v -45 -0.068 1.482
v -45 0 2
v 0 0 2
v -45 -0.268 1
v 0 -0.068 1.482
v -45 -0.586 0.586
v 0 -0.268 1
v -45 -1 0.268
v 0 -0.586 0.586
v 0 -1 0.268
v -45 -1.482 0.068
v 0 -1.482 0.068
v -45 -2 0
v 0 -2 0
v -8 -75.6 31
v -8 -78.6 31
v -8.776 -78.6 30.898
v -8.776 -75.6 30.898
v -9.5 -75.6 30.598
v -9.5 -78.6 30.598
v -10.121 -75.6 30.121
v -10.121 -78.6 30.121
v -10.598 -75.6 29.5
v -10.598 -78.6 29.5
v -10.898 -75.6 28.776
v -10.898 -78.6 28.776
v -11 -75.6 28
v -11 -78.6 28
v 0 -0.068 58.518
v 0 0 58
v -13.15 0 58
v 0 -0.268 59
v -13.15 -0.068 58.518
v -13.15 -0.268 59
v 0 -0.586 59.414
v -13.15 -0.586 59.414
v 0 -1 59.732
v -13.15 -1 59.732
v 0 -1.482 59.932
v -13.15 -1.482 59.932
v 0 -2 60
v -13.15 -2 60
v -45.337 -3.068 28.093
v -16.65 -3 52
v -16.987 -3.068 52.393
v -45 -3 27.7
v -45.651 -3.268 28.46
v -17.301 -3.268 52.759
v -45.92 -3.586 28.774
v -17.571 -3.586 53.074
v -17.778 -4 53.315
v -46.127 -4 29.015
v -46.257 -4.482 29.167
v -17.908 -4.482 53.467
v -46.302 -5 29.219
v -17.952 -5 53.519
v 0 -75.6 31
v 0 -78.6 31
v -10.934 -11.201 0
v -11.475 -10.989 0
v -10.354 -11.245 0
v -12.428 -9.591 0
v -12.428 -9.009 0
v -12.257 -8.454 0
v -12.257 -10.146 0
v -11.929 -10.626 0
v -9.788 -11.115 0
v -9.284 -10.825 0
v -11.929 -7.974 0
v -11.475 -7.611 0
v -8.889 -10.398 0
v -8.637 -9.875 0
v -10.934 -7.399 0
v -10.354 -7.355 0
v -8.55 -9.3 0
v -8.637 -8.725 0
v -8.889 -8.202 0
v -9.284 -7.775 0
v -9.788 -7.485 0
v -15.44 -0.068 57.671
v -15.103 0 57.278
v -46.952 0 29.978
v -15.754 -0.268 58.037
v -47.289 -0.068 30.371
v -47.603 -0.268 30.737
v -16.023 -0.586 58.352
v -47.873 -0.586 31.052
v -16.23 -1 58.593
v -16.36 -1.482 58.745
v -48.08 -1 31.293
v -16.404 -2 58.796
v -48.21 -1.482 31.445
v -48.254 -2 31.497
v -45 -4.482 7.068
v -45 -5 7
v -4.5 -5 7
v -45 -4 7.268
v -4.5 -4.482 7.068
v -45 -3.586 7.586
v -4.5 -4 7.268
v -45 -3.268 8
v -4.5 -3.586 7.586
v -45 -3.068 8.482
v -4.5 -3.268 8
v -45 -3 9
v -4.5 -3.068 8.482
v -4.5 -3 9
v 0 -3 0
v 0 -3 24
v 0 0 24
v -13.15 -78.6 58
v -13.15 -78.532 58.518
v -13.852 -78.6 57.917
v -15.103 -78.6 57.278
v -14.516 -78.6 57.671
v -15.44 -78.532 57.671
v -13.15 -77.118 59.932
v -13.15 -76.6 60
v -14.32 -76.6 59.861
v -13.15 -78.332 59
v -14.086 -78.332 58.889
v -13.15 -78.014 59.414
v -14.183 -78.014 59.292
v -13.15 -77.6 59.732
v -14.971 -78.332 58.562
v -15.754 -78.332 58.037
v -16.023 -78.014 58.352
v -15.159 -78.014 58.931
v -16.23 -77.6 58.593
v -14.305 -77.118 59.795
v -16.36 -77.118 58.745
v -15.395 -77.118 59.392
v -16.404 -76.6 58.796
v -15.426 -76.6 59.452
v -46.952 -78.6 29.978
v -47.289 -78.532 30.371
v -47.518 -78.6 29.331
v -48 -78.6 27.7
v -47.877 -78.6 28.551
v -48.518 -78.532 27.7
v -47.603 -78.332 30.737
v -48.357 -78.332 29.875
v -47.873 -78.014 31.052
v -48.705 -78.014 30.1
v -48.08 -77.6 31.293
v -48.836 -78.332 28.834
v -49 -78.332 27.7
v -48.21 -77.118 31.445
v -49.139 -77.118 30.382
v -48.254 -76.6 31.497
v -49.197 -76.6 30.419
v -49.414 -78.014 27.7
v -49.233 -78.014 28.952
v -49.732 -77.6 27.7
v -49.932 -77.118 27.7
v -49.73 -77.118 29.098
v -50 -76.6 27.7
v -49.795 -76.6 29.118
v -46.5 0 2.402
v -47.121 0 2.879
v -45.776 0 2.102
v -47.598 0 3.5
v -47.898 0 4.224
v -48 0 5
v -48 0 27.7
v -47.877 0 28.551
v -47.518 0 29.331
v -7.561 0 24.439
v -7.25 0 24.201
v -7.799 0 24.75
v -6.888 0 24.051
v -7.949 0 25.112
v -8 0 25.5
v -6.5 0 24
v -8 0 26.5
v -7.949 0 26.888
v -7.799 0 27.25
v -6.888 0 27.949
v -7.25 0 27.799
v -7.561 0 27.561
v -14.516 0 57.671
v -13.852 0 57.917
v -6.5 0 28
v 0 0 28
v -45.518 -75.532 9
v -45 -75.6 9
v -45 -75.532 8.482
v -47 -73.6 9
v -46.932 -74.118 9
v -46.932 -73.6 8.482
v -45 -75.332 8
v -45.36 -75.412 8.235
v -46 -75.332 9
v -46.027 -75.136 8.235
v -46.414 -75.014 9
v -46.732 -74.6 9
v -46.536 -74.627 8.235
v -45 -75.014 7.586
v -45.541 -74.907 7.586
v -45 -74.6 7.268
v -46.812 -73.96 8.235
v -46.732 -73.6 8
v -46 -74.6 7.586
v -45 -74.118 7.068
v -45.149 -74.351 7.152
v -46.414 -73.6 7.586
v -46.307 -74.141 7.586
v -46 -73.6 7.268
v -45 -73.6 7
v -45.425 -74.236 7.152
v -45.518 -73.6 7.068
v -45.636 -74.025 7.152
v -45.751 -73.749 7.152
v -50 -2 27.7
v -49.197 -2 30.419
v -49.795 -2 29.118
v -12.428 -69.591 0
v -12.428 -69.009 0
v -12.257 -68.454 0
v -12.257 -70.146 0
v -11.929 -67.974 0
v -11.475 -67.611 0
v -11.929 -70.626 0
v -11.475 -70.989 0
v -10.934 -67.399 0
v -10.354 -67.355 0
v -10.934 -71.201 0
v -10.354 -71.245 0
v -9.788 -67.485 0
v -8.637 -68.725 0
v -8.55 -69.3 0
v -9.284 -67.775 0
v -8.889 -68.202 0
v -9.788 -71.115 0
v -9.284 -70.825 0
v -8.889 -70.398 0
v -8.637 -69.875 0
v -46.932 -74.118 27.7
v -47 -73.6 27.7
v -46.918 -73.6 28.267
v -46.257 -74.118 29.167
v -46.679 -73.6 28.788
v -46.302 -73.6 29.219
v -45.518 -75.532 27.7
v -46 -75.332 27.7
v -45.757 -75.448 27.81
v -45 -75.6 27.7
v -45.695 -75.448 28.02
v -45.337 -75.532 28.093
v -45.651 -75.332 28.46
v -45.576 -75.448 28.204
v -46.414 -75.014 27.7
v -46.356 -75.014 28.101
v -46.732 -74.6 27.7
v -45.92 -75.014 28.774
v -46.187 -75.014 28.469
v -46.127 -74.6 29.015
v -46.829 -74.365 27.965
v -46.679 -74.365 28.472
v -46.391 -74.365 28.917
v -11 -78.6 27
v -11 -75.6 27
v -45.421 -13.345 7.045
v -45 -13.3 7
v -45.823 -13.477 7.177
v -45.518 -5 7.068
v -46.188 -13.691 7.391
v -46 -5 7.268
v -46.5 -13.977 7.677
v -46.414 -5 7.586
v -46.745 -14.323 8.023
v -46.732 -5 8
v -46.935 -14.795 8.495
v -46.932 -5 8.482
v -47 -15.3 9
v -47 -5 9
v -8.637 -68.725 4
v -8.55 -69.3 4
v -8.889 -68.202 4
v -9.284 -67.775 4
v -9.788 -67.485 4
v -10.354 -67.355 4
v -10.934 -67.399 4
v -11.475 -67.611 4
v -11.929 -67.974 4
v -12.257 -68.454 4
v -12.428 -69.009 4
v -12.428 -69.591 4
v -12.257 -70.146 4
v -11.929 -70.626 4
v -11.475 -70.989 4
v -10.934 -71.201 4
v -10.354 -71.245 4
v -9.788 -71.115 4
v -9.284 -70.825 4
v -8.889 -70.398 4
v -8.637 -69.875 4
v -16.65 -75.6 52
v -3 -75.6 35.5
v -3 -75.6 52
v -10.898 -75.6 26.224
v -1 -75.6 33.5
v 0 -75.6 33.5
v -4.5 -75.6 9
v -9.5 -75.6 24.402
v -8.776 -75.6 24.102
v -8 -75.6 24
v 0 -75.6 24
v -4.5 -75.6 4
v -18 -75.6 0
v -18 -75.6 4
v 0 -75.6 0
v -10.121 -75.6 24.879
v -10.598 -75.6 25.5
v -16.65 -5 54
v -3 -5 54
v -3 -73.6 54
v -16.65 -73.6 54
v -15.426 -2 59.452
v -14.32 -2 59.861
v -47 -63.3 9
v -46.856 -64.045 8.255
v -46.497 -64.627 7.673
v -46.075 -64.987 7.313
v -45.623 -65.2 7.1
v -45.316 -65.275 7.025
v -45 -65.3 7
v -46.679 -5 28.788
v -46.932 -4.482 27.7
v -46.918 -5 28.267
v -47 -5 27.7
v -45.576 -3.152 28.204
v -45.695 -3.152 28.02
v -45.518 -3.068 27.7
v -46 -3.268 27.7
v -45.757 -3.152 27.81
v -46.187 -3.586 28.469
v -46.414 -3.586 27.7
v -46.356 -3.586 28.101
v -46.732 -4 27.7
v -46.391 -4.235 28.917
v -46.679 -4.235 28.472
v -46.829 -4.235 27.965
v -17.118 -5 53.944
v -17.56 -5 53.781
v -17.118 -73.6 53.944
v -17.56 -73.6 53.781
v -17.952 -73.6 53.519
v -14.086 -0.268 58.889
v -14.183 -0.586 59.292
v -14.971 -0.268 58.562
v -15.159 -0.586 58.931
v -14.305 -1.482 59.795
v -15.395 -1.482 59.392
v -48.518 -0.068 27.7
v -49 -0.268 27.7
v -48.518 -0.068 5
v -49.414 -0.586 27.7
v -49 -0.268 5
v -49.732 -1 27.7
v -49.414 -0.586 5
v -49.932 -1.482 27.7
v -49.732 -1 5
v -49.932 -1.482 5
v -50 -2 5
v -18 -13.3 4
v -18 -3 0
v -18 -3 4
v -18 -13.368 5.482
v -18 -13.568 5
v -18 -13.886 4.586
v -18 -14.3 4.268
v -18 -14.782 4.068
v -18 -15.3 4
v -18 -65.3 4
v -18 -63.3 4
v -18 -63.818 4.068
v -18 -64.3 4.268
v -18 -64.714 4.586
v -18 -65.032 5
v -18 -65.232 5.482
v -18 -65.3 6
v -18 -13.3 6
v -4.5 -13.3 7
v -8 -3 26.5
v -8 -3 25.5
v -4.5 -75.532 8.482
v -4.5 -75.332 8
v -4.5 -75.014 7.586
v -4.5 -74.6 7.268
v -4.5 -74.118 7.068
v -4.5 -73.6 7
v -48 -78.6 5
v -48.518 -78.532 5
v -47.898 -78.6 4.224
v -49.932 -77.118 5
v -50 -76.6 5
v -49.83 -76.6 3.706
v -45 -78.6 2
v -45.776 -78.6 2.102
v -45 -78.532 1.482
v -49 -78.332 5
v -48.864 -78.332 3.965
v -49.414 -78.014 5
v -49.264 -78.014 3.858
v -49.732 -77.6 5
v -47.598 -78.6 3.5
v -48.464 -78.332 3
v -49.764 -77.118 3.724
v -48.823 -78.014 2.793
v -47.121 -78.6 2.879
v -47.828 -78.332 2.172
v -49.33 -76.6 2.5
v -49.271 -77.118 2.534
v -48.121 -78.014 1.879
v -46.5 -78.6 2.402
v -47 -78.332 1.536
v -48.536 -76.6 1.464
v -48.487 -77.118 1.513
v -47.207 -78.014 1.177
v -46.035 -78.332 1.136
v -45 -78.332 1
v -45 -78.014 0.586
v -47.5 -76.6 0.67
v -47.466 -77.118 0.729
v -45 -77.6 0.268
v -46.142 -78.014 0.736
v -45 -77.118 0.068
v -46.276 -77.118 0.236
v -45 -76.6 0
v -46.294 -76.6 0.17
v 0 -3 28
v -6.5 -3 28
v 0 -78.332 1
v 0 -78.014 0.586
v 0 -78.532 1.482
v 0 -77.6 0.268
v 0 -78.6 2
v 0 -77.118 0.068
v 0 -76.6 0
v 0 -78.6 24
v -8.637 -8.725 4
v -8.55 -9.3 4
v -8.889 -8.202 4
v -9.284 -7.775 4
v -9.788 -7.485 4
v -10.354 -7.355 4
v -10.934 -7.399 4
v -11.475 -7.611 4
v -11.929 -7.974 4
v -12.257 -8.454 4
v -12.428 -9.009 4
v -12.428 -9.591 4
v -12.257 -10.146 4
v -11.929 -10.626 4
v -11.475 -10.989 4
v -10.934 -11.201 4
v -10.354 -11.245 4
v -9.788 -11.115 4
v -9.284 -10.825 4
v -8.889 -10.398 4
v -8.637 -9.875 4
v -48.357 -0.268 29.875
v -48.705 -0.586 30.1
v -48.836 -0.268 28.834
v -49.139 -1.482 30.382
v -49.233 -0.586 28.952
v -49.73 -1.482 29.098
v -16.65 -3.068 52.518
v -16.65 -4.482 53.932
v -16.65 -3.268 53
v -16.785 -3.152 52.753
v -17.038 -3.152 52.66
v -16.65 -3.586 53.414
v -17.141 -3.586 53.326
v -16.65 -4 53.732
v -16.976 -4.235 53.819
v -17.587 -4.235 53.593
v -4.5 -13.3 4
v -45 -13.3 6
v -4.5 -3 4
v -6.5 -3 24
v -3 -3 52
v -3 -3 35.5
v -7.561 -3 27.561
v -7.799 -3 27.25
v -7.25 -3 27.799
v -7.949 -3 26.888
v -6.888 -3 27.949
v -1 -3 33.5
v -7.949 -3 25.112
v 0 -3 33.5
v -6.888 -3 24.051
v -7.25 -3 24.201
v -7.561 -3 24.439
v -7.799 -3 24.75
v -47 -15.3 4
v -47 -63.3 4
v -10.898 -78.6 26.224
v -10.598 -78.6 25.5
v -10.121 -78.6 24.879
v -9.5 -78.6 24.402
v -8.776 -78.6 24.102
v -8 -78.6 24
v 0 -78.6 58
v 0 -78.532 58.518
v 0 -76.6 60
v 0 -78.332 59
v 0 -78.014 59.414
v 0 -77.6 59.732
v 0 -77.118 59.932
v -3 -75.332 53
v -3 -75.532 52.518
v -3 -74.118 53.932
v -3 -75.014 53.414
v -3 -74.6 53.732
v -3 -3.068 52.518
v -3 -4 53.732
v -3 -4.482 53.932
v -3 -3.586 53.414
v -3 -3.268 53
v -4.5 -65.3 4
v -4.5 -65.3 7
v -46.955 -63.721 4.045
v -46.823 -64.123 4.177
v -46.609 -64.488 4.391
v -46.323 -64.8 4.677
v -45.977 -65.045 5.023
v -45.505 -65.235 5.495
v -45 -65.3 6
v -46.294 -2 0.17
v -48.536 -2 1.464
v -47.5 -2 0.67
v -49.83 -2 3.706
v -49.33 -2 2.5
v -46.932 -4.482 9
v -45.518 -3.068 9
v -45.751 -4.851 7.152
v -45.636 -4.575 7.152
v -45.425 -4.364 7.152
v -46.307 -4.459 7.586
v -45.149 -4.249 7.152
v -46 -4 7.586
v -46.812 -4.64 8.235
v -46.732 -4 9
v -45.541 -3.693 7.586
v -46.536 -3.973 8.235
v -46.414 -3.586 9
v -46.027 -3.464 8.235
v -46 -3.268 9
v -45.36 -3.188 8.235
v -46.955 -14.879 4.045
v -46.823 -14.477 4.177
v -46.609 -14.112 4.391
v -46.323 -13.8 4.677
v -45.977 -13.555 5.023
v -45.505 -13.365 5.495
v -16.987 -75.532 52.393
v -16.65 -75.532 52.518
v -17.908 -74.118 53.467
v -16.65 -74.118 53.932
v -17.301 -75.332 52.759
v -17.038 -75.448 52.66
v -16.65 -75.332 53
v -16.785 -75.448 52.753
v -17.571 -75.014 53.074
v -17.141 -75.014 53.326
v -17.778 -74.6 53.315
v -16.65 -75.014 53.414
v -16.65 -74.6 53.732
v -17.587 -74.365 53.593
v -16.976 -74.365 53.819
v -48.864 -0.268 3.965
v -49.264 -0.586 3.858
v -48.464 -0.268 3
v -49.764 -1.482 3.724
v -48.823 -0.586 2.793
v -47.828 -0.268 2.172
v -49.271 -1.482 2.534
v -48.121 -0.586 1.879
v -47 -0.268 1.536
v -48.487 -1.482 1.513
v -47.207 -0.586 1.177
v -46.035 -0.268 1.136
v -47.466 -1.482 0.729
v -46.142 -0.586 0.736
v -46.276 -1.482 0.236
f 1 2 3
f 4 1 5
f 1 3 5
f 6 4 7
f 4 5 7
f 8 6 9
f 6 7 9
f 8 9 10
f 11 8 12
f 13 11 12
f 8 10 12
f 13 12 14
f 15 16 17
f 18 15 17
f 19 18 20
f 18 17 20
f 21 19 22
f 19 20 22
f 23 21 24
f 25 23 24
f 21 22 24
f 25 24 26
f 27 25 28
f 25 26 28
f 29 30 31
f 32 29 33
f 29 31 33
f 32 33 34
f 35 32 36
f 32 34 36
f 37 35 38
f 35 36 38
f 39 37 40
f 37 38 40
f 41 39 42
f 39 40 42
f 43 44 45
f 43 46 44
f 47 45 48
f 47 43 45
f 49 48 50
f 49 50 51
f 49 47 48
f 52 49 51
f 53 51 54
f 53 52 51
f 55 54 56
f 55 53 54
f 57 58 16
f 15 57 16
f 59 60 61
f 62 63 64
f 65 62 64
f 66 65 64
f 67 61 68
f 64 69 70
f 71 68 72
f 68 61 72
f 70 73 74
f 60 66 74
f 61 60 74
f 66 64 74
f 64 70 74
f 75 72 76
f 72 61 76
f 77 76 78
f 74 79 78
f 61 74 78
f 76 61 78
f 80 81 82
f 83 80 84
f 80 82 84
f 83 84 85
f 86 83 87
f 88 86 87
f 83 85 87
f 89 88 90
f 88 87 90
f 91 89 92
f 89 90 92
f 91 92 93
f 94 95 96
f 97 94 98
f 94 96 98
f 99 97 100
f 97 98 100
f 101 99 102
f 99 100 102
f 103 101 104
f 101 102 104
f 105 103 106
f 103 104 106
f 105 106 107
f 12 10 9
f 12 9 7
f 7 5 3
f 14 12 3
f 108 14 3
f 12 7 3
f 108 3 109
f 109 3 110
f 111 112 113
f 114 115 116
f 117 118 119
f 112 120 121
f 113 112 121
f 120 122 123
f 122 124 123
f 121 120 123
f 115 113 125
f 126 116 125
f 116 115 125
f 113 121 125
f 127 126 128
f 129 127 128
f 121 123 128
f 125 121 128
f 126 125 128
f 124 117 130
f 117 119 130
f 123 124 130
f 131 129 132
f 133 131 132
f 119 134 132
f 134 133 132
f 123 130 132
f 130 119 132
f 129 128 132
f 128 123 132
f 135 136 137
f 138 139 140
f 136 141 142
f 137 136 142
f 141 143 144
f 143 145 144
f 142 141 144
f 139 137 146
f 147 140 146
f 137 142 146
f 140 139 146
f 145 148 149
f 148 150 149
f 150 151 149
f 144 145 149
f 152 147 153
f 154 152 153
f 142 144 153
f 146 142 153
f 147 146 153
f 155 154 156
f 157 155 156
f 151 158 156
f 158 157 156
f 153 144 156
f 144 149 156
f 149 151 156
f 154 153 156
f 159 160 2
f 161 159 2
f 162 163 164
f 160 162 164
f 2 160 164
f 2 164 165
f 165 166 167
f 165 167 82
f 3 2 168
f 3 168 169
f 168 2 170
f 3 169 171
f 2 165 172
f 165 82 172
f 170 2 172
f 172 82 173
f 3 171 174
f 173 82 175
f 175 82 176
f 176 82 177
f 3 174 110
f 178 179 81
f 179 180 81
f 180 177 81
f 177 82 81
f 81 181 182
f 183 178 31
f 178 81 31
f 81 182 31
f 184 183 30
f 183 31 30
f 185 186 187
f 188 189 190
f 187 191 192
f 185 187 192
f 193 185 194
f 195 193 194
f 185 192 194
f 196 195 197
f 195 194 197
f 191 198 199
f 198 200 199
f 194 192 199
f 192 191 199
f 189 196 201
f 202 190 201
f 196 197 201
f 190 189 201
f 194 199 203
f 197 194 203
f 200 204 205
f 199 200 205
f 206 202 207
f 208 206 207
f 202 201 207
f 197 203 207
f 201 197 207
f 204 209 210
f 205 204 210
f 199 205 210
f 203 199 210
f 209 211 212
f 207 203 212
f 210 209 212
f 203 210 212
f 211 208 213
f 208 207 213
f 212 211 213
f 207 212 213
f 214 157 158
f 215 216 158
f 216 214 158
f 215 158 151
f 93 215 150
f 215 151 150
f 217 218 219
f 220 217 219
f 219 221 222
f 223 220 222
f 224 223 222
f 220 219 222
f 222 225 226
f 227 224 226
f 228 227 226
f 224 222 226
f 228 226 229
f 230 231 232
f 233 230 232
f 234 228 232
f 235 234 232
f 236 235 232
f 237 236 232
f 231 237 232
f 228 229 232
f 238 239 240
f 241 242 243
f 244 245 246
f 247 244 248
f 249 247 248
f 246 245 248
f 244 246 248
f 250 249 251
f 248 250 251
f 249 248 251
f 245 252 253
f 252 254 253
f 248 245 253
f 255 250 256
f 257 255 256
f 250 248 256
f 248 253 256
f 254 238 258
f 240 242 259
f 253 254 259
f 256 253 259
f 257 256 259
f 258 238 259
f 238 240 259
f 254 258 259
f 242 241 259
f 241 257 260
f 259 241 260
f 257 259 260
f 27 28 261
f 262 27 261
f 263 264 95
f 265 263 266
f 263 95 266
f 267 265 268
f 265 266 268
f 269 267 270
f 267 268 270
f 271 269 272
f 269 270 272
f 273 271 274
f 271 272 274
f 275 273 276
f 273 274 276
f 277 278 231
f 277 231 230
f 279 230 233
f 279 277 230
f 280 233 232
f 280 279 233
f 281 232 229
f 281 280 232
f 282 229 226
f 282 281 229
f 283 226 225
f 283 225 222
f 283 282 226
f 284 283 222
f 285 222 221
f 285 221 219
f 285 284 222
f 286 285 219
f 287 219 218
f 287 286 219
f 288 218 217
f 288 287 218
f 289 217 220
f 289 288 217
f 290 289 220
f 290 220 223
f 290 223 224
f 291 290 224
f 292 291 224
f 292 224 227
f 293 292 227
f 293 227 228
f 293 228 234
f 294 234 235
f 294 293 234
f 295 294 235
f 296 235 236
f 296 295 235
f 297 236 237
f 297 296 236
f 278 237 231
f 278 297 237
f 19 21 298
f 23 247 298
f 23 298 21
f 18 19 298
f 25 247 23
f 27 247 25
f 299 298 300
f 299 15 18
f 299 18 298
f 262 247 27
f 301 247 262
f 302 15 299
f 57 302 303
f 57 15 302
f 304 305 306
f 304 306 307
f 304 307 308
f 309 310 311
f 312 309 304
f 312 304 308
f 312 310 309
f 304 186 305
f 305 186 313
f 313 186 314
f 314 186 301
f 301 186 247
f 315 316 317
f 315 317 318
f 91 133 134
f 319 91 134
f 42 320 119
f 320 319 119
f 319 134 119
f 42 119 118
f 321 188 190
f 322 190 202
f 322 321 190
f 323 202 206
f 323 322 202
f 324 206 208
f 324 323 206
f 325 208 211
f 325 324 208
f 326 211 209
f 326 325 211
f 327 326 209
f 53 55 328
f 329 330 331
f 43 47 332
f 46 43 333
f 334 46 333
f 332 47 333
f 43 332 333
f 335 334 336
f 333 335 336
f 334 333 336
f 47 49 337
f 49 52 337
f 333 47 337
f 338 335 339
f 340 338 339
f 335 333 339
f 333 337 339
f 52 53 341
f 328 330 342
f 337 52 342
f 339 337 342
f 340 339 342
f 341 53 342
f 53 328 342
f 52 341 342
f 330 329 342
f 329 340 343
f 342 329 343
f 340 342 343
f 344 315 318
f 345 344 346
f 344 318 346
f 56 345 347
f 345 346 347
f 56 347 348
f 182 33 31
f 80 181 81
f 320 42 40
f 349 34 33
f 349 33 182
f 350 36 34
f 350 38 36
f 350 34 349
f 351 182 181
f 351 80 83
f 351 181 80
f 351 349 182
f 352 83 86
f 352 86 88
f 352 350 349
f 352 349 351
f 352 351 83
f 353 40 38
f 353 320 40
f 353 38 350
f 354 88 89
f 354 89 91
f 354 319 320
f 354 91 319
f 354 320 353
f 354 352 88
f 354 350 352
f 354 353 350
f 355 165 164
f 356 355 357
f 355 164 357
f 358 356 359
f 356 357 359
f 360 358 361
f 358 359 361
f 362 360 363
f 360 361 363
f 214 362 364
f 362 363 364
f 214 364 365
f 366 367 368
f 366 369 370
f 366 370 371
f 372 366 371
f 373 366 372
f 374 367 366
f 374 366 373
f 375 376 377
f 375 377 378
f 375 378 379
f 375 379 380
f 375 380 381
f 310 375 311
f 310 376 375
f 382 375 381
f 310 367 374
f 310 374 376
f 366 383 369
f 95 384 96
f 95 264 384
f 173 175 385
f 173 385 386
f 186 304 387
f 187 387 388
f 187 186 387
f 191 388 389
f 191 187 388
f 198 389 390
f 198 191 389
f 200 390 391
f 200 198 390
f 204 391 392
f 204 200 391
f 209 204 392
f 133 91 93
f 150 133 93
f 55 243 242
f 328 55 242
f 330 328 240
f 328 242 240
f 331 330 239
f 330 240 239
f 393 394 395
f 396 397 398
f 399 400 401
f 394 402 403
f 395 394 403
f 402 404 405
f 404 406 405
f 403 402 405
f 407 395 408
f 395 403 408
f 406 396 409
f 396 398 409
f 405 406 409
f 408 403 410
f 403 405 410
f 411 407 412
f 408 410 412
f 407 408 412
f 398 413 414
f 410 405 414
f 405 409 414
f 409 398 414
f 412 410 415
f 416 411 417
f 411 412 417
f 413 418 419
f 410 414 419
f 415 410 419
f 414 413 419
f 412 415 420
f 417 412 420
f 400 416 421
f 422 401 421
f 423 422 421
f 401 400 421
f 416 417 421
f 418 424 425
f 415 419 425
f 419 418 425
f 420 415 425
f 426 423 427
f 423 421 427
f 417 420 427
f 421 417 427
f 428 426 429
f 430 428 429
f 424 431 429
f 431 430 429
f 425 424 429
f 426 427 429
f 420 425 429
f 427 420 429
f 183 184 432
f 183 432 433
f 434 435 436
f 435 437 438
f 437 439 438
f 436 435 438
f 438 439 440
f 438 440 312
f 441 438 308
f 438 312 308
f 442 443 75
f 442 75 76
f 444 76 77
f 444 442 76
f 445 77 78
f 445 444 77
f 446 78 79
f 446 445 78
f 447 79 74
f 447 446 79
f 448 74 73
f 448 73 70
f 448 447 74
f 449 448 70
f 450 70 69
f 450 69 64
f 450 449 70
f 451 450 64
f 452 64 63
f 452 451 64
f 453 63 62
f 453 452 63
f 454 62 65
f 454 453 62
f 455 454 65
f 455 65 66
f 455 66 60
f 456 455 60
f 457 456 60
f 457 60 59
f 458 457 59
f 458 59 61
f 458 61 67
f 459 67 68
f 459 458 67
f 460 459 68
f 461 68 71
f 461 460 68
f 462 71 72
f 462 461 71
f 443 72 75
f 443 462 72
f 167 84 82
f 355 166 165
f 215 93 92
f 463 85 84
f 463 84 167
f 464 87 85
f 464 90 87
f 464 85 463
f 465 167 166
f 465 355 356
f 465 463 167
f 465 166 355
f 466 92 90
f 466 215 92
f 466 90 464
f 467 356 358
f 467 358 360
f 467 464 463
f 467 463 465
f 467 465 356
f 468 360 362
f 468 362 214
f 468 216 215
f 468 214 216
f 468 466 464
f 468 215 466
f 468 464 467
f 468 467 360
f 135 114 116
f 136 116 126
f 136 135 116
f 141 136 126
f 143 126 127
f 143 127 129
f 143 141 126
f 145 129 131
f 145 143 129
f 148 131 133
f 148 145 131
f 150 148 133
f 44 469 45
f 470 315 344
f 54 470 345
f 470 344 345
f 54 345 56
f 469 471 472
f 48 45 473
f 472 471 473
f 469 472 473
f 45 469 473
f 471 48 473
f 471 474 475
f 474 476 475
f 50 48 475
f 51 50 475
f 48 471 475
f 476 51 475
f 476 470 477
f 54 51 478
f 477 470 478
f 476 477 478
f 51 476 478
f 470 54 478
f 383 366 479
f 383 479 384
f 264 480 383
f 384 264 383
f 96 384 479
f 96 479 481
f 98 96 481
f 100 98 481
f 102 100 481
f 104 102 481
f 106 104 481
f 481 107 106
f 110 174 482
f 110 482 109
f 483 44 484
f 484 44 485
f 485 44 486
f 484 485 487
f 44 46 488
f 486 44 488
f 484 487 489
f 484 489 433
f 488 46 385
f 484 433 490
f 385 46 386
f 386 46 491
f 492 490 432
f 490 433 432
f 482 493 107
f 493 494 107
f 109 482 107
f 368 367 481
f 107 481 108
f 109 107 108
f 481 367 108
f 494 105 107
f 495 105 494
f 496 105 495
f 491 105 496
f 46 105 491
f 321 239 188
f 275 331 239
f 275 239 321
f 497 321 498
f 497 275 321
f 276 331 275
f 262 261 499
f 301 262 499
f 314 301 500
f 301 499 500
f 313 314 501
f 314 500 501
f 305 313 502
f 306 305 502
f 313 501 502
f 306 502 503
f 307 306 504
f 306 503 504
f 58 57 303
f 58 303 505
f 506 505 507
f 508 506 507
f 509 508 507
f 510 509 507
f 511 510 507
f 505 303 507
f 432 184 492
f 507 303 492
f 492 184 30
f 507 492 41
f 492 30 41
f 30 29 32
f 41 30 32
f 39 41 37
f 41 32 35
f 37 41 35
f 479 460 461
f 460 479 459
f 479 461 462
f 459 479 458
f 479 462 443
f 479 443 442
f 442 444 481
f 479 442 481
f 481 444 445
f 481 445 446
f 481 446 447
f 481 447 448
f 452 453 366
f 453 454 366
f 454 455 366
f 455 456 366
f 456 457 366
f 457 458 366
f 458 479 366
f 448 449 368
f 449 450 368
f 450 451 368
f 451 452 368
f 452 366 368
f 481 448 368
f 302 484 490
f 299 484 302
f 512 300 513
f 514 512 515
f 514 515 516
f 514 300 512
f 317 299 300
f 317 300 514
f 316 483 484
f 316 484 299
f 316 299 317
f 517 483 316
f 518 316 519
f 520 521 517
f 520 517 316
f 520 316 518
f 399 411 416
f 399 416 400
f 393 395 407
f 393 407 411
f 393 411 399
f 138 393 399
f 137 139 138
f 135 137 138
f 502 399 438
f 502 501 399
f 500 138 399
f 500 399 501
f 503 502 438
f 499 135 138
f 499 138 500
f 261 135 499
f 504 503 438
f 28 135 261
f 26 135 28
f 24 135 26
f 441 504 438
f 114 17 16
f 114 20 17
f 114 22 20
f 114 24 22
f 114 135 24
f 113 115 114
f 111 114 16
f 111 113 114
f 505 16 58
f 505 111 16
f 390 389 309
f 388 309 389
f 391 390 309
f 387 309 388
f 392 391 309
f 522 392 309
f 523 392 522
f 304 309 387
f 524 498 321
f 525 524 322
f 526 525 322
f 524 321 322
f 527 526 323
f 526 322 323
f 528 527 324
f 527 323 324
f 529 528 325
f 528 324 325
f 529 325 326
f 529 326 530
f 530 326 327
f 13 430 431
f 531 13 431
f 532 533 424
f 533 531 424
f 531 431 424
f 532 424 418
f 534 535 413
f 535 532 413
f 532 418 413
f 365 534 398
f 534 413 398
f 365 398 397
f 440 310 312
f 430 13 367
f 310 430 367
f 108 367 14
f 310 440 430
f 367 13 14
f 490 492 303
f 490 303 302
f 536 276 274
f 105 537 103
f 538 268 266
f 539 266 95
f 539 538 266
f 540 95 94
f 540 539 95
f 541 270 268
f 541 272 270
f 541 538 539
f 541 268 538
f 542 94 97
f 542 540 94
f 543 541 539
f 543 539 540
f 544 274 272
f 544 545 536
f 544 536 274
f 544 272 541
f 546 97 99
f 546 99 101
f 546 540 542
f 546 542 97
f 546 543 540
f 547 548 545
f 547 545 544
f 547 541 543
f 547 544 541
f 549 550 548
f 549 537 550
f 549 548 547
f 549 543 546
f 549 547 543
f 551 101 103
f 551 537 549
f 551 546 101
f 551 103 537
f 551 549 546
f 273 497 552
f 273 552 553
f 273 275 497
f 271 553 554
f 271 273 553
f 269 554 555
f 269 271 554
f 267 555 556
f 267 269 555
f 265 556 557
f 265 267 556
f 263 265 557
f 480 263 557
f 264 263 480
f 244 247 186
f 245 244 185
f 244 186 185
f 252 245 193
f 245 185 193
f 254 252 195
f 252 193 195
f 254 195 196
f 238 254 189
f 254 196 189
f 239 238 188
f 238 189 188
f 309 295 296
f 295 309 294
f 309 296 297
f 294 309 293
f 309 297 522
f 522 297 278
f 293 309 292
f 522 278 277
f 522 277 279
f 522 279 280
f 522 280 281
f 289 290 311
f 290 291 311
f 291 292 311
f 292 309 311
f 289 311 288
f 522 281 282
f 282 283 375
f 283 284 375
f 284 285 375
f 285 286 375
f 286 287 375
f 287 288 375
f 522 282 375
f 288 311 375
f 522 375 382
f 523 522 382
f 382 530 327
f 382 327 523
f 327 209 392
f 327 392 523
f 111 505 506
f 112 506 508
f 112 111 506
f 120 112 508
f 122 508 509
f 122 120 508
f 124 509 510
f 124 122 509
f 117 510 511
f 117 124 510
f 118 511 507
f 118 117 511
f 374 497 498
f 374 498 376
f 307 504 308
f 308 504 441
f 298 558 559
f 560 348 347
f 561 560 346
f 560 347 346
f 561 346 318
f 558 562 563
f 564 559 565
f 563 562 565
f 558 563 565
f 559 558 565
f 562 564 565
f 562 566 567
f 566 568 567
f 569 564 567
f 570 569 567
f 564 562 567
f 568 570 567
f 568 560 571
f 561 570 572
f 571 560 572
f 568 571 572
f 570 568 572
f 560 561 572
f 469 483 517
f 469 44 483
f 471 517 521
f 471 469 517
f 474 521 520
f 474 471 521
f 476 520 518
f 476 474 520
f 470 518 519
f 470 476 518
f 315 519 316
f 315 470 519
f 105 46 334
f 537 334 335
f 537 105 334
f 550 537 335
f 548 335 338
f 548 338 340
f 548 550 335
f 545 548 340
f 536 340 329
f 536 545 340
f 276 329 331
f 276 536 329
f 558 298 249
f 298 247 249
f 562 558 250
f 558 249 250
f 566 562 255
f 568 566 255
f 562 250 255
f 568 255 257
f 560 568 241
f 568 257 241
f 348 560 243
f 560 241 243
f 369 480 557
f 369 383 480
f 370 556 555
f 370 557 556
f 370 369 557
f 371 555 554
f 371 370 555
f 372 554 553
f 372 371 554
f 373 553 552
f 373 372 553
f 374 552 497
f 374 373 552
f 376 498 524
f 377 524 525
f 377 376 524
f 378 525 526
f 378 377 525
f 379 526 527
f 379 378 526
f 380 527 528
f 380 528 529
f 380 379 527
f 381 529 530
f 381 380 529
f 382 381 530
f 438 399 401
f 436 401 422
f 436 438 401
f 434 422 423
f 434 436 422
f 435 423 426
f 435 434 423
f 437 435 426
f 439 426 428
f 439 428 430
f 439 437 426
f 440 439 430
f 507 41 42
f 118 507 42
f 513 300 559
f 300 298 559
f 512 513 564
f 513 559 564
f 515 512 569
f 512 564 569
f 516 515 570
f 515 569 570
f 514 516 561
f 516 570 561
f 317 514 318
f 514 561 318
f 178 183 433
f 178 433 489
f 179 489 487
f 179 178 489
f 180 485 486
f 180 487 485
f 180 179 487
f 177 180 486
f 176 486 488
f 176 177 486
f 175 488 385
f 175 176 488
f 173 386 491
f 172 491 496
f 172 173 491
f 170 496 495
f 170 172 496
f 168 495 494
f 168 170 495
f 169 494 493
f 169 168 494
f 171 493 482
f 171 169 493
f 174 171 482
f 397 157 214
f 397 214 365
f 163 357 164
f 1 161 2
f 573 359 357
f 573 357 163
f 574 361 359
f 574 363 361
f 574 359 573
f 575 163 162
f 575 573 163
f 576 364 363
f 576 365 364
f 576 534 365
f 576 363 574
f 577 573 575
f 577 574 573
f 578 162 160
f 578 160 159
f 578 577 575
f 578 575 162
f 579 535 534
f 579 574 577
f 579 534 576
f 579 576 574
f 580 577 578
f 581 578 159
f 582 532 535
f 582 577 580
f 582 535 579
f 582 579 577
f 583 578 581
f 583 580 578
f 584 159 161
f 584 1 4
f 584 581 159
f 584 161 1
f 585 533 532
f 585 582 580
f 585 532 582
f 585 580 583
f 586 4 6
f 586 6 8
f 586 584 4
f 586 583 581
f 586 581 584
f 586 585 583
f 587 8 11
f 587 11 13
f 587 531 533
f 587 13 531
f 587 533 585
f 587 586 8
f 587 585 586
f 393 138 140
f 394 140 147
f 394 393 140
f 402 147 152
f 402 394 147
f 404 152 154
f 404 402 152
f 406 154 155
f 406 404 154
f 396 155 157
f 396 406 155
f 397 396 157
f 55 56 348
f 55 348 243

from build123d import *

# Parameters (mm, degrees)
F1_DEPTH  = 78.6
F4_DEPTH  = 72.6
F5_W      = 18
F5_H      = 72.6
F6_DEPTH  = 5
F8_DEPTH  = 5
F10_DEPTH = 5
F11_R     = 5
F12_R     = 2
F13_W     = 10.3
F13_H     = 3
F14_DEPTH = 42.5
F16_R     = 1.95
F17_DEPTH = 4
F18_SIZE  = 2
F19_R     = 2


with BuildPart() as f1:
    # F0 (on Front) → F1 (new body)
    with BuildSketch(Plane.XZ):
        Polygon((-50, 0), (0, 0), (0, 60), (-15, 60), (-50, 30), align=None)
    extrude(amount=F1_DEPTH)

    # F3 (on offset) → F4 (cut)
    with BuildSketch(Plane.XZ.offset(3)):
        Polygon((-47, 4), (0, 4), (0, 33.5), (-3, 33.5), (-3, 54), (-17.3902277714, 54), (-47, 28.6201952326), align=None)
    extrude(amount=F4_DEPTH, mode=Mode.SUBTRACT)

    # F5 (on face) → F6 (cut)
    with BuildSketch(Plane(origin=(0, 0, 0), x_dir=(1, 0, 0), z_dir=(0, 0, -1))):
        with Locations((-9, 39.3)):
            Rectangle(F5_W, F5_H)
    extrude(amount=-F6_DEPTH, mode=Mode.SUBTRACT)

    # F7 (on Front) → F8 (cut)
    with BuildSketch(Plane.XZ):
        with BuildLine():
            Line((-6.5, 24), (0, 24))
            Line((0, 24), (0, 28))
            Line((0, 28), (-6.5, 28))
            ThreePointArc((-6.5, 28), (-7.5606601718, 27.5606601718), (-8, 26.5))
            Line((-8, 26.5), (-8, 25.5))
            ThreePointArc((-8, 25.5), (-7.5606601718, 24.4393398282), (-6.5, 24))
        make_face()
    extrude(amount=F8_DEPTH, mode=Mode.SUBTRACT)

    # F9 (on face) → F10 (cut)
    with BuildSketch(Plane.XZ.offset(78.6)):
        with BuildLine():
            Line((-8, 24), (0, 24))
            Line((0, 24), (0, 31))
            Line((0, 31), (-8, 31))
            ThreePointArc((-8, 31), (-10.1213203436, 30.1213203436), (-11, 28))
            Line((-11, 28), (-11, 27))
            ThreePointArc((-11, 27), (-10.1213203436, 24.8786796564), (-8, 24))
        make_face()
    extrude(amount=-F10_DEPTH, mode=Mode.SUBTRACT)

    # F11
    f11_edges = [f1.edges().sort_by_distance(p)[0] for p in [
        (-15, -39.3, 60),
        (-50, -39.3, 30),
        (-50, -39.3, 0),
    ]]
    fillet(f11_edges, radius=F11_R)

    # F12
    f12_edges = [f1.edges().sort_by_distance(p)[0] for p in [
        (-32.329147, 0, 45.146446),
        (-32.329147, -78.6, 45.146446),
        (-22.5, 0, 0),
        (-22.5, -78.6, 0),
        (-50, 0, 16.350163),
        (-49.542564, 0, 29.789609),
        (-48.535534, 0, 1.464466),
        (-14.885111, 0, 59.689425),
        (-6.57519, 0, 60),
        (-48.535534, -78.6, 1.464466),
        (-50, -78.6, 16.350163),
        (-49.542564, -78.6, 29.789609),
        (-14.885111, -78.6, 59.689425),
        (-6.57519, -78.6, 60),
        (-10.195114, -3, 54),
        (-32.195114, -3, 41.310098),
        (-47, -3, 16.310098),
        (-47, -75.6, 16.310098),
        (-32.195114, -75.6, 41.310098),
        (-10.195114, -75.6, 54),
        (-17.390228, -39.3, 54),
        (-47, -39.3, 28.620195),
    ]]
    fillet(f12_edges, radius=F12_R)

    # F13 (on face) → F14 (join)
    with BuildSketch(Plane.YZ.offset(-47)):
        with Locations((-8.15, 5.5)):
            Rectangle(F13_W, F13_H)
        with Locations((-70.45, 5.5)):
            Rectangle(F13_W, F13_H)
    extrude(amount=F14_DEPTH)

    # F16 (on offset) → F17 (join)
    with BuildSketch(Plane.XY.offset(4)):
        with Locations((-10.5, -9.3)):
            Circle(F16_R)
        with Locations((-10.5, -69.3)):
            Circle(F16_R)
    extrude(amount=-F17_DEPTH)

    # F18
    f18_edges = [f1.edges().sort_by_distance(p)[0] for p in [
        (-3, -39.3, 33.5),
    ]]
    chamfer(f18_edges, length=F18_SIZE)

    # F19
    f19_edges = [f1.edges().sort_by_distance(p)[0] for p in [
        (-47, -9.15, 7),
        (-47, -13.3, 5.5),
        (-47, -69.45, 7),
        (-47, -65.3, 5.5),
        (-24.75, -75.6, 7),
        (-24.75, -3, 7),
        (-46.414214, -3.585786, 7),
        (-32.5, -13.3, 4),
        (-32.5, -65.3, 4),
        (-46.414214, -75.014214, 7),
    ]]
    fillet(f19_edges, radius=F19_R)


solid = f1.part
